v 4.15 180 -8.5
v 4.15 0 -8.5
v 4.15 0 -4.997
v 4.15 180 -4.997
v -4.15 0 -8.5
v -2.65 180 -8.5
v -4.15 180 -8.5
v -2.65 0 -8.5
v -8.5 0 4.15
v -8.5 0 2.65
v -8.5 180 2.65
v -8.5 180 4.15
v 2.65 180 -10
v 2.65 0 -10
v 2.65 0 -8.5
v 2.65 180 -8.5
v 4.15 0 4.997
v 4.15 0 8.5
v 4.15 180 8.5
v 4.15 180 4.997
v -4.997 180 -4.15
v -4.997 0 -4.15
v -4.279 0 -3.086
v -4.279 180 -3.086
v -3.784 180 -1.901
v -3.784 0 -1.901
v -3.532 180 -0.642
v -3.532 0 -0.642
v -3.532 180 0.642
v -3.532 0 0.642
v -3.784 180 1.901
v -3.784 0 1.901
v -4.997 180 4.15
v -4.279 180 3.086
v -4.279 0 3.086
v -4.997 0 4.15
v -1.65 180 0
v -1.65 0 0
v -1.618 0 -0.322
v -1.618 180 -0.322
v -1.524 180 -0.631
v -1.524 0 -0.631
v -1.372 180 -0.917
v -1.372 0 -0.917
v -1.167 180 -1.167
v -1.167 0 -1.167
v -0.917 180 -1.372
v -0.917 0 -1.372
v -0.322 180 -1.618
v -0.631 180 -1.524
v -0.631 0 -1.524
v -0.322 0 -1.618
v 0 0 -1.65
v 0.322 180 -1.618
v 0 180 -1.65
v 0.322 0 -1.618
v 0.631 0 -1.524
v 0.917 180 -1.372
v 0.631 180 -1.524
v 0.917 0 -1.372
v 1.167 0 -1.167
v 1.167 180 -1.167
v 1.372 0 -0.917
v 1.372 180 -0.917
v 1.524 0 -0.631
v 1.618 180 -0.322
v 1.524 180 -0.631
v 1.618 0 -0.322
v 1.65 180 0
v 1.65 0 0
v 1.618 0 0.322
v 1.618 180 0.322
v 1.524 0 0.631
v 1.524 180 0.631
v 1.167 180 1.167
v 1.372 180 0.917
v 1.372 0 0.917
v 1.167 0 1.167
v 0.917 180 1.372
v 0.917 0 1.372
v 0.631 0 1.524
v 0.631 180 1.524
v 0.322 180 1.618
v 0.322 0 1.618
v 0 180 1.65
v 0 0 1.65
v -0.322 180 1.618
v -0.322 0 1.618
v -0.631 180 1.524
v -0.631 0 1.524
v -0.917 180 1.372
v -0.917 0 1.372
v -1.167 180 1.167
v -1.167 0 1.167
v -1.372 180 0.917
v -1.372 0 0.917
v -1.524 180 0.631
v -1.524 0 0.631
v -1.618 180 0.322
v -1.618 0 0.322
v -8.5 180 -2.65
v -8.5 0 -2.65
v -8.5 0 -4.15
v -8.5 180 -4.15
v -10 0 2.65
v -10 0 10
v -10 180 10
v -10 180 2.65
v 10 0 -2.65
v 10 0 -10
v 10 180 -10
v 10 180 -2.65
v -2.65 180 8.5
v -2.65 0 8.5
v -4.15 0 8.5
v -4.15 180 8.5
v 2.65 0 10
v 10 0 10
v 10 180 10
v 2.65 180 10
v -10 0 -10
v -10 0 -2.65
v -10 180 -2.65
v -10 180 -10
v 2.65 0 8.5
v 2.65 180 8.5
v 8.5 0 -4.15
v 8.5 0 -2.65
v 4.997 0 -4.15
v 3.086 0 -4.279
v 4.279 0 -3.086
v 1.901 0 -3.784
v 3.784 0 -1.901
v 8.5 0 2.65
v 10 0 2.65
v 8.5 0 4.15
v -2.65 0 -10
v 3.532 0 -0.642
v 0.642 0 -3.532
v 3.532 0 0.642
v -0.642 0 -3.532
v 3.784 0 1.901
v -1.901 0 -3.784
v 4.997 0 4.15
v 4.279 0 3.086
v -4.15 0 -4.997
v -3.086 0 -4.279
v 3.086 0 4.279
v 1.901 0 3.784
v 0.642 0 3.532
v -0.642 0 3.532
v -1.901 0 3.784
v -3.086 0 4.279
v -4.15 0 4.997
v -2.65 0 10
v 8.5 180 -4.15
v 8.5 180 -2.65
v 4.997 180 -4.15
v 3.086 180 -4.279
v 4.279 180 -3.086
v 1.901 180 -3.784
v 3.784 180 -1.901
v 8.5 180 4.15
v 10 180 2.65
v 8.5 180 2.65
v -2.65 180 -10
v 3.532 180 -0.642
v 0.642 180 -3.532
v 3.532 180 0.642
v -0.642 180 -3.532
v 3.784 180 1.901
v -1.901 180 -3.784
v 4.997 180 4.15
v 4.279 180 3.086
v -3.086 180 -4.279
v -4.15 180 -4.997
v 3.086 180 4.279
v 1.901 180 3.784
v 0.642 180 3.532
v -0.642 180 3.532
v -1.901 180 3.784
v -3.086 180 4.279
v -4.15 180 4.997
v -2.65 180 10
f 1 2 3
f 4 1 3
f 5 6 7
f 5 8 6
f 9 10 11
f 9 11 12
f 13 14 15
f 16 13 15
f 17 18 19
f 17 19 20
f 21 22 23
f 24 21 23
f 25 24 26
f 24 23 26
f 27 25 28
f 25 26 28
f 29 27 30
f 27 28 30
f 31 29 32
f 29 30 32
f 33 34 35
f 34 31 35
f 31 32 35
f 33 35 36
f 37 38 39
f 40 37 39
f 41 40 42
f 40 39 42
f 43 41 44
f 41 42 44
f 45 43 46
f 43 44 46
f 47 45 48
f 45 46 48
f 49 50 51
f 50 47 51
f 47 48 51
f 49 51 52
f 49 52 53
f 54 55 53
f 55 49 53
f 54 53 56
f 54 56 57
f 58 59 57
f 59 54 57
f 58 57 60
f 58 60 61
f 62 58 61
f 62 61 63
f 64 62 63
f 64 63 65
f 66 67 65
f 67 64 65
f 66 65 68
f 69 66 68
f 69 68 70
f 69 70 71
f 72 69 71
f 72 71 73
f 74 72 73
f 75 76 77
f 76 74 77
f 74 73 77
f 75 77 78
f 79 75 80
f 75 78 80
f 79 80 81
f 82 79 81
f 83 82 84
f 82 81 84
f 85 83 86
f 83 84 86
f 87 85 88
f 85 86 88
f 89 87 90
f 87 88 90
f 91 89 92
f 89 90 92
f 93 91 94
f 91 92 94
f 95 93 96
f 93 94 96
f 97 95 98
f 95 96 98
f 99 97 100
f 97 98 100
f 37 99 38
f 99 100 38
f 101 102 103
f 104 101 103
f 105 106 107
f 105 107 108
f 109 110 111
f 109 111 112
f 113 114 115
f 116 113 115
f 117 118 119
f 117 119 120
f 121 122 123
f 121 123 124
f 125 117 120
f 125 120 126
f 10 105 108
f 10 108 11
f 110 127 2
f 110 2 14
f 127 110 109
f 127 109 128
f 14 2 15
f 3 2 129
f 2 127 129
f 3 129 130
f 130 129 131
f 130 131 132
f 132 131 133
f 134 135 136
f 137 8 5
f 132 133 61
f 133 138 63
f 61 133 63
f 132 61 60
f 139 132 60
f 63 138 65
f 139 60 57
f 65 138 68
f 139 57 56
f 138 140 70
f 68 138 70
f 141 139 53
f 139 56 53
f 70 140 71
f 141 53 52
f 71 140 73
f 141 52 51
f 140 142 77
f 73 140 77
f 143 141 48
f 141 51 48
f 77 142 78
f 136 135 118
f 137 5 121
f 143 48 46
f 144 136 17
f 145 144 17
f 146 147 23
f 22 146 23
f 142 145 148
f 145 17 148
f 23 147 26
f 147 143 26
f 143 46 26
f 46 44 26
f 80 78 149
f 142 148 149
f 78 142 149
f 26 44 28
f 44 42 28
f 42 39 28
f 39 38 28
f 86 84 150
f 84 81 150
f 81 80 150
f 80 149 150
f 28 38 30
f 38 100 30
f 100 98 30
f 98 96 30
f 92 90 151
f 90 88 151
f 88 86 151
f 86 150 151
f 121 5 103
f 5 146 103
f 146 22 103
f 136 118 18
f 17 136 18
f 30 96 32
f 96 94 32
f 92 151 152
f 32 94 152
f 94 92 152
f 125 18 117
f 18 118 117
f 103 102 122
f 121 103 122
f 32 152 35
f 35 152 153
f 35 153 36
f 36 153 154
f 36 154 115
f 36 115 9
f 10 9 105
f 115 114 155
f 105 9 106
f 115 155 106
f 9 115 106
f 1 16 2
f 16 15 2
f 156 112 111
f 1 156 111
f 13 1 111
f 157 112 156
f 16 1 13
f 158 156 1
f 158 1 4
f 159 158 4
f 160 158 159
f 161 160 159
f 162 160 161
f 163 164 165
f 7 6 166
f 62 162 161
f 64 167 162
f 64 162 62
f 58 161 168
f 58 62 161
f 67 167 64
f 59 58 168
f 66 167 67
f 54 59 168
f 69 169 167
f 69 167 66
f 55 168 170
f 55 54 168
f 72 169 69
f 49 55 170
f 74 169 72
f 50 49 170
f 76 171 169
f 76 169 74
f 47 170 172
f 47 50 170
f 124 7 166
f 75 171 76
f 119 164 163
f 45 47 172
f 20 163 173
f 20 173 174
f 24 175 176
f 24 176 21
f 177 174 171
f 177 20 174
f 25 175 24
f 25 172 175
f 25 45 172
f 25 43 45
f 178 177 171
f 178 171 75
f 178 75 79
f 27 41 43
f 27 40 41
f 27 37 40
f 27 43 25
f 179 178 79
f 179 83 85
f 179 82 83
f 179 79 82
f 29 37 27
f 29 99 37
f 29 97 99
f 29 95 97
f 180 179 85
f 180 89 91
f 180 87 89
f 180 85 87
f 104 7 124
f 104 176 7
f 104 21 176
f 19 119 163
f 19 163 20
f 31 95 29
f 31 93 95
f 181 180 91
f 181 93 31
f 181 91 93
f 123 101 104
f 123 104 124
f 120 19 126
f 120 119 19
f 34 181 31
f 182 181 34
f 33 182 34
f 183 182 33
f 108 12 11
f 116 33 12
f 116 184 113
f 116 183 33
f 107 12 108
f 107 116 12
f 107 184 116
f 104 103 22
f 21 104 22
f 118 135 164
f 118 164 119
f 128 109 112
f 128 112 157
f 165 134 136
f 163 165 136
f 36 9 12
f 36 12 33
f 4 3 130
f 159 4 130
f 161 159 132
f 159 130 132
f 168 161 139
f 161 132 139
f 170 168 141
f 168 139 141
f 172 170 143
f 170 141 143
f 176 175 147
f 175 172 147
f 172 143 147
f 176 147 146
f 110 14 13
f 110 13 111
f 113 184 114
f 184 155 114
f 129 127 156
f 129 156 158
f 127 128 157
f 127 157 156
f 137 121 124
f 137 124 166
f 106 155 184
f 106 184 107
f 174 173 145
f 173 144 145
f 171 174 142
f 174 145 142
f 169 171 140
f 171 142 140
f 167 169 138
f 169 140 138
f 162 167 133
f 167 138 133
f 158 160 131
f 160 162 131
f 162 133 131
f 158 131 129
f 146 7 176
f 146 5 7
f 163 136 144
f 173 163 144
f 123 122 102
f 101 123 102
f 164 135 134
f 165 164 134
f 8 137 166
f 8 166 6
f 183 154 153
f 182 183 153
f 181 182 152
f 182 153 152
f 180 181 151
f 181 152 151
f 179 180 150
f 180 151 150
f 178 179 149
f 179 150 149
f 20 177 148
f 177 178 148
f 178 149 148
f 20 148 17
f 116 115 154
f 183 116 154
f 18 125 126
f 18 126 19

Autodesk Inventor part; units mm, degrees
ref_plane "YZ Plane" through (0, 0, 0) normal (1, 0, 0) x (0, 1, 0)
ref_plane "XZ Plane" through (0, 0, 0) normal (0, 1, 0) x (-1, 0, 0)
ref_plane "XY Plane" through (0, 0, 0) normal (0, 0, 1) x (1, 0, 0)
sketch "草圖1" plane through (0, 0, 0) normal (0, 1, 0) x (-1, 0, 0)
  line L0 (10, 10) -> (10, -10)
  line L1 (-10, -10) -> (-10, 10)
  line L2 (-10, 10) -> (10, -10) construction
  line L3 (10, 10) -> (-10, -10) construction
  line L4 (2.65, -10) -> (2.65, -8.5)
  line L5 (2.65, -8.5) -> (4.15, -8.5)
  line L6 (4.15, -8.5) -> (4.15, -4.9973)
  arc A0 (4.15, -4.9973) -> (-4.15, -4.9973) centre (0, -10) ccw
  line L7 (0, -10) -> (0, 0) construction
  line L8 (-2.65, -10) -> (-2.65, -8.5)
  line L9 (-2.65, -8.5) -> (-4.15, -8.5)
  line L10 (-4.15, -8.5) -> (-4.15, -4.9973)
  arc A1 (4.9973, 4.15) -> (4.9973, -4.15) centre (10, 0) ccw
  line L11 (10, 2.65) -> (8.5, 2.65)
  line L12 (8.5, 2.65) -> (8.5, 4.15)
  line L13 (8.5, 4.15) -> (4.9973, 4.15)
  line L14 (10, -2.65) -> (8.5, -2.65)
  line L15 (8.5, -2.65) -> (8.5, -4.15)
  line L16 (8.5, -4.15) -> (4.9973, -4.15)
  arc A2 (-4.15, 4.9973) -> (4.15, 4.9973) centre (0, 10) ccw
  line L17 (-2.65, 10) -> (-2.65, 8.5)
  line L18 (-2.65, 8.5) -> (-4.15, 8.5)
  line L19 (-4.15, 8.5) -> (-4.15, 4.9973)
  line L20 (2.65, 10) -> (2.65, 8.5)
  line L21 (2.65, 8.5) -> (4.15, 8.5)
  line L22 (4.15, 8.5) -> (4.15, 4.9973)
  arc A3 (-4.9973, -4.15) -> (-4.9973, 4.15) centre (-10, 0) ccw
  line L23 (-10, -2.65) -> (-8.5, -2.65)
  line L24 (-8.5, -2.65) -> (-8.5, -4.15)
  line L25 (-8.5, -4.15) -> (-4.9973, -4.15)
  line L26 (-10, 2.65) -> (-8.5, 2.65)
  line L27 (-8.5, 2.65) -> (-8.5, 4.15)
  line L28 (-8.5, 4.15) -> (-4.9973, 4.15)
  line L29 (10, -10) -> (2.65, -10)
  line L30 (-2.65, -10) -> (-10, -10)
  line L31 (-10, 10) -> (-2.65, 10)
  line L32 (2.65, 10) -> (10, 10)
  circle A4 centre (0, 0) radius 1.65
  point P0 (2.65, -9.25)
  point P1 (-2.65, -9.25)
  point P2 (9.25, 2.65)
  point P3 (9.25, -2.65)
  point P4 (-2.65, 9.25)
  point P5 (2.65, 9.25)
  point P6 (-9.25, -2.65)
  point P7 (-9.25, 2.65)
  dimension "d0" = 20
  dimension "d1" = 20
  dimension "d2" = 13
  dimension "d3" = 1.5
  dimension "d4" = 2.65
  dimension "d5" = 4.15
  dimension "d8" = 360
  dimension "d10" = 3.3
extrude "擠出1" add sketch "草圖1" along normal blind 180 contours L0 L11 L12 L13 A1 L16 L15 L14 L29 L4 L5 L6 A0 L10 L9 L8 L30 L1 L23 L24 L25 A3 L28 L27 L26 L31 L17 L18 L19 A2 L22 L21 L20 L32
properties part number "j2j3 alumi ext"
